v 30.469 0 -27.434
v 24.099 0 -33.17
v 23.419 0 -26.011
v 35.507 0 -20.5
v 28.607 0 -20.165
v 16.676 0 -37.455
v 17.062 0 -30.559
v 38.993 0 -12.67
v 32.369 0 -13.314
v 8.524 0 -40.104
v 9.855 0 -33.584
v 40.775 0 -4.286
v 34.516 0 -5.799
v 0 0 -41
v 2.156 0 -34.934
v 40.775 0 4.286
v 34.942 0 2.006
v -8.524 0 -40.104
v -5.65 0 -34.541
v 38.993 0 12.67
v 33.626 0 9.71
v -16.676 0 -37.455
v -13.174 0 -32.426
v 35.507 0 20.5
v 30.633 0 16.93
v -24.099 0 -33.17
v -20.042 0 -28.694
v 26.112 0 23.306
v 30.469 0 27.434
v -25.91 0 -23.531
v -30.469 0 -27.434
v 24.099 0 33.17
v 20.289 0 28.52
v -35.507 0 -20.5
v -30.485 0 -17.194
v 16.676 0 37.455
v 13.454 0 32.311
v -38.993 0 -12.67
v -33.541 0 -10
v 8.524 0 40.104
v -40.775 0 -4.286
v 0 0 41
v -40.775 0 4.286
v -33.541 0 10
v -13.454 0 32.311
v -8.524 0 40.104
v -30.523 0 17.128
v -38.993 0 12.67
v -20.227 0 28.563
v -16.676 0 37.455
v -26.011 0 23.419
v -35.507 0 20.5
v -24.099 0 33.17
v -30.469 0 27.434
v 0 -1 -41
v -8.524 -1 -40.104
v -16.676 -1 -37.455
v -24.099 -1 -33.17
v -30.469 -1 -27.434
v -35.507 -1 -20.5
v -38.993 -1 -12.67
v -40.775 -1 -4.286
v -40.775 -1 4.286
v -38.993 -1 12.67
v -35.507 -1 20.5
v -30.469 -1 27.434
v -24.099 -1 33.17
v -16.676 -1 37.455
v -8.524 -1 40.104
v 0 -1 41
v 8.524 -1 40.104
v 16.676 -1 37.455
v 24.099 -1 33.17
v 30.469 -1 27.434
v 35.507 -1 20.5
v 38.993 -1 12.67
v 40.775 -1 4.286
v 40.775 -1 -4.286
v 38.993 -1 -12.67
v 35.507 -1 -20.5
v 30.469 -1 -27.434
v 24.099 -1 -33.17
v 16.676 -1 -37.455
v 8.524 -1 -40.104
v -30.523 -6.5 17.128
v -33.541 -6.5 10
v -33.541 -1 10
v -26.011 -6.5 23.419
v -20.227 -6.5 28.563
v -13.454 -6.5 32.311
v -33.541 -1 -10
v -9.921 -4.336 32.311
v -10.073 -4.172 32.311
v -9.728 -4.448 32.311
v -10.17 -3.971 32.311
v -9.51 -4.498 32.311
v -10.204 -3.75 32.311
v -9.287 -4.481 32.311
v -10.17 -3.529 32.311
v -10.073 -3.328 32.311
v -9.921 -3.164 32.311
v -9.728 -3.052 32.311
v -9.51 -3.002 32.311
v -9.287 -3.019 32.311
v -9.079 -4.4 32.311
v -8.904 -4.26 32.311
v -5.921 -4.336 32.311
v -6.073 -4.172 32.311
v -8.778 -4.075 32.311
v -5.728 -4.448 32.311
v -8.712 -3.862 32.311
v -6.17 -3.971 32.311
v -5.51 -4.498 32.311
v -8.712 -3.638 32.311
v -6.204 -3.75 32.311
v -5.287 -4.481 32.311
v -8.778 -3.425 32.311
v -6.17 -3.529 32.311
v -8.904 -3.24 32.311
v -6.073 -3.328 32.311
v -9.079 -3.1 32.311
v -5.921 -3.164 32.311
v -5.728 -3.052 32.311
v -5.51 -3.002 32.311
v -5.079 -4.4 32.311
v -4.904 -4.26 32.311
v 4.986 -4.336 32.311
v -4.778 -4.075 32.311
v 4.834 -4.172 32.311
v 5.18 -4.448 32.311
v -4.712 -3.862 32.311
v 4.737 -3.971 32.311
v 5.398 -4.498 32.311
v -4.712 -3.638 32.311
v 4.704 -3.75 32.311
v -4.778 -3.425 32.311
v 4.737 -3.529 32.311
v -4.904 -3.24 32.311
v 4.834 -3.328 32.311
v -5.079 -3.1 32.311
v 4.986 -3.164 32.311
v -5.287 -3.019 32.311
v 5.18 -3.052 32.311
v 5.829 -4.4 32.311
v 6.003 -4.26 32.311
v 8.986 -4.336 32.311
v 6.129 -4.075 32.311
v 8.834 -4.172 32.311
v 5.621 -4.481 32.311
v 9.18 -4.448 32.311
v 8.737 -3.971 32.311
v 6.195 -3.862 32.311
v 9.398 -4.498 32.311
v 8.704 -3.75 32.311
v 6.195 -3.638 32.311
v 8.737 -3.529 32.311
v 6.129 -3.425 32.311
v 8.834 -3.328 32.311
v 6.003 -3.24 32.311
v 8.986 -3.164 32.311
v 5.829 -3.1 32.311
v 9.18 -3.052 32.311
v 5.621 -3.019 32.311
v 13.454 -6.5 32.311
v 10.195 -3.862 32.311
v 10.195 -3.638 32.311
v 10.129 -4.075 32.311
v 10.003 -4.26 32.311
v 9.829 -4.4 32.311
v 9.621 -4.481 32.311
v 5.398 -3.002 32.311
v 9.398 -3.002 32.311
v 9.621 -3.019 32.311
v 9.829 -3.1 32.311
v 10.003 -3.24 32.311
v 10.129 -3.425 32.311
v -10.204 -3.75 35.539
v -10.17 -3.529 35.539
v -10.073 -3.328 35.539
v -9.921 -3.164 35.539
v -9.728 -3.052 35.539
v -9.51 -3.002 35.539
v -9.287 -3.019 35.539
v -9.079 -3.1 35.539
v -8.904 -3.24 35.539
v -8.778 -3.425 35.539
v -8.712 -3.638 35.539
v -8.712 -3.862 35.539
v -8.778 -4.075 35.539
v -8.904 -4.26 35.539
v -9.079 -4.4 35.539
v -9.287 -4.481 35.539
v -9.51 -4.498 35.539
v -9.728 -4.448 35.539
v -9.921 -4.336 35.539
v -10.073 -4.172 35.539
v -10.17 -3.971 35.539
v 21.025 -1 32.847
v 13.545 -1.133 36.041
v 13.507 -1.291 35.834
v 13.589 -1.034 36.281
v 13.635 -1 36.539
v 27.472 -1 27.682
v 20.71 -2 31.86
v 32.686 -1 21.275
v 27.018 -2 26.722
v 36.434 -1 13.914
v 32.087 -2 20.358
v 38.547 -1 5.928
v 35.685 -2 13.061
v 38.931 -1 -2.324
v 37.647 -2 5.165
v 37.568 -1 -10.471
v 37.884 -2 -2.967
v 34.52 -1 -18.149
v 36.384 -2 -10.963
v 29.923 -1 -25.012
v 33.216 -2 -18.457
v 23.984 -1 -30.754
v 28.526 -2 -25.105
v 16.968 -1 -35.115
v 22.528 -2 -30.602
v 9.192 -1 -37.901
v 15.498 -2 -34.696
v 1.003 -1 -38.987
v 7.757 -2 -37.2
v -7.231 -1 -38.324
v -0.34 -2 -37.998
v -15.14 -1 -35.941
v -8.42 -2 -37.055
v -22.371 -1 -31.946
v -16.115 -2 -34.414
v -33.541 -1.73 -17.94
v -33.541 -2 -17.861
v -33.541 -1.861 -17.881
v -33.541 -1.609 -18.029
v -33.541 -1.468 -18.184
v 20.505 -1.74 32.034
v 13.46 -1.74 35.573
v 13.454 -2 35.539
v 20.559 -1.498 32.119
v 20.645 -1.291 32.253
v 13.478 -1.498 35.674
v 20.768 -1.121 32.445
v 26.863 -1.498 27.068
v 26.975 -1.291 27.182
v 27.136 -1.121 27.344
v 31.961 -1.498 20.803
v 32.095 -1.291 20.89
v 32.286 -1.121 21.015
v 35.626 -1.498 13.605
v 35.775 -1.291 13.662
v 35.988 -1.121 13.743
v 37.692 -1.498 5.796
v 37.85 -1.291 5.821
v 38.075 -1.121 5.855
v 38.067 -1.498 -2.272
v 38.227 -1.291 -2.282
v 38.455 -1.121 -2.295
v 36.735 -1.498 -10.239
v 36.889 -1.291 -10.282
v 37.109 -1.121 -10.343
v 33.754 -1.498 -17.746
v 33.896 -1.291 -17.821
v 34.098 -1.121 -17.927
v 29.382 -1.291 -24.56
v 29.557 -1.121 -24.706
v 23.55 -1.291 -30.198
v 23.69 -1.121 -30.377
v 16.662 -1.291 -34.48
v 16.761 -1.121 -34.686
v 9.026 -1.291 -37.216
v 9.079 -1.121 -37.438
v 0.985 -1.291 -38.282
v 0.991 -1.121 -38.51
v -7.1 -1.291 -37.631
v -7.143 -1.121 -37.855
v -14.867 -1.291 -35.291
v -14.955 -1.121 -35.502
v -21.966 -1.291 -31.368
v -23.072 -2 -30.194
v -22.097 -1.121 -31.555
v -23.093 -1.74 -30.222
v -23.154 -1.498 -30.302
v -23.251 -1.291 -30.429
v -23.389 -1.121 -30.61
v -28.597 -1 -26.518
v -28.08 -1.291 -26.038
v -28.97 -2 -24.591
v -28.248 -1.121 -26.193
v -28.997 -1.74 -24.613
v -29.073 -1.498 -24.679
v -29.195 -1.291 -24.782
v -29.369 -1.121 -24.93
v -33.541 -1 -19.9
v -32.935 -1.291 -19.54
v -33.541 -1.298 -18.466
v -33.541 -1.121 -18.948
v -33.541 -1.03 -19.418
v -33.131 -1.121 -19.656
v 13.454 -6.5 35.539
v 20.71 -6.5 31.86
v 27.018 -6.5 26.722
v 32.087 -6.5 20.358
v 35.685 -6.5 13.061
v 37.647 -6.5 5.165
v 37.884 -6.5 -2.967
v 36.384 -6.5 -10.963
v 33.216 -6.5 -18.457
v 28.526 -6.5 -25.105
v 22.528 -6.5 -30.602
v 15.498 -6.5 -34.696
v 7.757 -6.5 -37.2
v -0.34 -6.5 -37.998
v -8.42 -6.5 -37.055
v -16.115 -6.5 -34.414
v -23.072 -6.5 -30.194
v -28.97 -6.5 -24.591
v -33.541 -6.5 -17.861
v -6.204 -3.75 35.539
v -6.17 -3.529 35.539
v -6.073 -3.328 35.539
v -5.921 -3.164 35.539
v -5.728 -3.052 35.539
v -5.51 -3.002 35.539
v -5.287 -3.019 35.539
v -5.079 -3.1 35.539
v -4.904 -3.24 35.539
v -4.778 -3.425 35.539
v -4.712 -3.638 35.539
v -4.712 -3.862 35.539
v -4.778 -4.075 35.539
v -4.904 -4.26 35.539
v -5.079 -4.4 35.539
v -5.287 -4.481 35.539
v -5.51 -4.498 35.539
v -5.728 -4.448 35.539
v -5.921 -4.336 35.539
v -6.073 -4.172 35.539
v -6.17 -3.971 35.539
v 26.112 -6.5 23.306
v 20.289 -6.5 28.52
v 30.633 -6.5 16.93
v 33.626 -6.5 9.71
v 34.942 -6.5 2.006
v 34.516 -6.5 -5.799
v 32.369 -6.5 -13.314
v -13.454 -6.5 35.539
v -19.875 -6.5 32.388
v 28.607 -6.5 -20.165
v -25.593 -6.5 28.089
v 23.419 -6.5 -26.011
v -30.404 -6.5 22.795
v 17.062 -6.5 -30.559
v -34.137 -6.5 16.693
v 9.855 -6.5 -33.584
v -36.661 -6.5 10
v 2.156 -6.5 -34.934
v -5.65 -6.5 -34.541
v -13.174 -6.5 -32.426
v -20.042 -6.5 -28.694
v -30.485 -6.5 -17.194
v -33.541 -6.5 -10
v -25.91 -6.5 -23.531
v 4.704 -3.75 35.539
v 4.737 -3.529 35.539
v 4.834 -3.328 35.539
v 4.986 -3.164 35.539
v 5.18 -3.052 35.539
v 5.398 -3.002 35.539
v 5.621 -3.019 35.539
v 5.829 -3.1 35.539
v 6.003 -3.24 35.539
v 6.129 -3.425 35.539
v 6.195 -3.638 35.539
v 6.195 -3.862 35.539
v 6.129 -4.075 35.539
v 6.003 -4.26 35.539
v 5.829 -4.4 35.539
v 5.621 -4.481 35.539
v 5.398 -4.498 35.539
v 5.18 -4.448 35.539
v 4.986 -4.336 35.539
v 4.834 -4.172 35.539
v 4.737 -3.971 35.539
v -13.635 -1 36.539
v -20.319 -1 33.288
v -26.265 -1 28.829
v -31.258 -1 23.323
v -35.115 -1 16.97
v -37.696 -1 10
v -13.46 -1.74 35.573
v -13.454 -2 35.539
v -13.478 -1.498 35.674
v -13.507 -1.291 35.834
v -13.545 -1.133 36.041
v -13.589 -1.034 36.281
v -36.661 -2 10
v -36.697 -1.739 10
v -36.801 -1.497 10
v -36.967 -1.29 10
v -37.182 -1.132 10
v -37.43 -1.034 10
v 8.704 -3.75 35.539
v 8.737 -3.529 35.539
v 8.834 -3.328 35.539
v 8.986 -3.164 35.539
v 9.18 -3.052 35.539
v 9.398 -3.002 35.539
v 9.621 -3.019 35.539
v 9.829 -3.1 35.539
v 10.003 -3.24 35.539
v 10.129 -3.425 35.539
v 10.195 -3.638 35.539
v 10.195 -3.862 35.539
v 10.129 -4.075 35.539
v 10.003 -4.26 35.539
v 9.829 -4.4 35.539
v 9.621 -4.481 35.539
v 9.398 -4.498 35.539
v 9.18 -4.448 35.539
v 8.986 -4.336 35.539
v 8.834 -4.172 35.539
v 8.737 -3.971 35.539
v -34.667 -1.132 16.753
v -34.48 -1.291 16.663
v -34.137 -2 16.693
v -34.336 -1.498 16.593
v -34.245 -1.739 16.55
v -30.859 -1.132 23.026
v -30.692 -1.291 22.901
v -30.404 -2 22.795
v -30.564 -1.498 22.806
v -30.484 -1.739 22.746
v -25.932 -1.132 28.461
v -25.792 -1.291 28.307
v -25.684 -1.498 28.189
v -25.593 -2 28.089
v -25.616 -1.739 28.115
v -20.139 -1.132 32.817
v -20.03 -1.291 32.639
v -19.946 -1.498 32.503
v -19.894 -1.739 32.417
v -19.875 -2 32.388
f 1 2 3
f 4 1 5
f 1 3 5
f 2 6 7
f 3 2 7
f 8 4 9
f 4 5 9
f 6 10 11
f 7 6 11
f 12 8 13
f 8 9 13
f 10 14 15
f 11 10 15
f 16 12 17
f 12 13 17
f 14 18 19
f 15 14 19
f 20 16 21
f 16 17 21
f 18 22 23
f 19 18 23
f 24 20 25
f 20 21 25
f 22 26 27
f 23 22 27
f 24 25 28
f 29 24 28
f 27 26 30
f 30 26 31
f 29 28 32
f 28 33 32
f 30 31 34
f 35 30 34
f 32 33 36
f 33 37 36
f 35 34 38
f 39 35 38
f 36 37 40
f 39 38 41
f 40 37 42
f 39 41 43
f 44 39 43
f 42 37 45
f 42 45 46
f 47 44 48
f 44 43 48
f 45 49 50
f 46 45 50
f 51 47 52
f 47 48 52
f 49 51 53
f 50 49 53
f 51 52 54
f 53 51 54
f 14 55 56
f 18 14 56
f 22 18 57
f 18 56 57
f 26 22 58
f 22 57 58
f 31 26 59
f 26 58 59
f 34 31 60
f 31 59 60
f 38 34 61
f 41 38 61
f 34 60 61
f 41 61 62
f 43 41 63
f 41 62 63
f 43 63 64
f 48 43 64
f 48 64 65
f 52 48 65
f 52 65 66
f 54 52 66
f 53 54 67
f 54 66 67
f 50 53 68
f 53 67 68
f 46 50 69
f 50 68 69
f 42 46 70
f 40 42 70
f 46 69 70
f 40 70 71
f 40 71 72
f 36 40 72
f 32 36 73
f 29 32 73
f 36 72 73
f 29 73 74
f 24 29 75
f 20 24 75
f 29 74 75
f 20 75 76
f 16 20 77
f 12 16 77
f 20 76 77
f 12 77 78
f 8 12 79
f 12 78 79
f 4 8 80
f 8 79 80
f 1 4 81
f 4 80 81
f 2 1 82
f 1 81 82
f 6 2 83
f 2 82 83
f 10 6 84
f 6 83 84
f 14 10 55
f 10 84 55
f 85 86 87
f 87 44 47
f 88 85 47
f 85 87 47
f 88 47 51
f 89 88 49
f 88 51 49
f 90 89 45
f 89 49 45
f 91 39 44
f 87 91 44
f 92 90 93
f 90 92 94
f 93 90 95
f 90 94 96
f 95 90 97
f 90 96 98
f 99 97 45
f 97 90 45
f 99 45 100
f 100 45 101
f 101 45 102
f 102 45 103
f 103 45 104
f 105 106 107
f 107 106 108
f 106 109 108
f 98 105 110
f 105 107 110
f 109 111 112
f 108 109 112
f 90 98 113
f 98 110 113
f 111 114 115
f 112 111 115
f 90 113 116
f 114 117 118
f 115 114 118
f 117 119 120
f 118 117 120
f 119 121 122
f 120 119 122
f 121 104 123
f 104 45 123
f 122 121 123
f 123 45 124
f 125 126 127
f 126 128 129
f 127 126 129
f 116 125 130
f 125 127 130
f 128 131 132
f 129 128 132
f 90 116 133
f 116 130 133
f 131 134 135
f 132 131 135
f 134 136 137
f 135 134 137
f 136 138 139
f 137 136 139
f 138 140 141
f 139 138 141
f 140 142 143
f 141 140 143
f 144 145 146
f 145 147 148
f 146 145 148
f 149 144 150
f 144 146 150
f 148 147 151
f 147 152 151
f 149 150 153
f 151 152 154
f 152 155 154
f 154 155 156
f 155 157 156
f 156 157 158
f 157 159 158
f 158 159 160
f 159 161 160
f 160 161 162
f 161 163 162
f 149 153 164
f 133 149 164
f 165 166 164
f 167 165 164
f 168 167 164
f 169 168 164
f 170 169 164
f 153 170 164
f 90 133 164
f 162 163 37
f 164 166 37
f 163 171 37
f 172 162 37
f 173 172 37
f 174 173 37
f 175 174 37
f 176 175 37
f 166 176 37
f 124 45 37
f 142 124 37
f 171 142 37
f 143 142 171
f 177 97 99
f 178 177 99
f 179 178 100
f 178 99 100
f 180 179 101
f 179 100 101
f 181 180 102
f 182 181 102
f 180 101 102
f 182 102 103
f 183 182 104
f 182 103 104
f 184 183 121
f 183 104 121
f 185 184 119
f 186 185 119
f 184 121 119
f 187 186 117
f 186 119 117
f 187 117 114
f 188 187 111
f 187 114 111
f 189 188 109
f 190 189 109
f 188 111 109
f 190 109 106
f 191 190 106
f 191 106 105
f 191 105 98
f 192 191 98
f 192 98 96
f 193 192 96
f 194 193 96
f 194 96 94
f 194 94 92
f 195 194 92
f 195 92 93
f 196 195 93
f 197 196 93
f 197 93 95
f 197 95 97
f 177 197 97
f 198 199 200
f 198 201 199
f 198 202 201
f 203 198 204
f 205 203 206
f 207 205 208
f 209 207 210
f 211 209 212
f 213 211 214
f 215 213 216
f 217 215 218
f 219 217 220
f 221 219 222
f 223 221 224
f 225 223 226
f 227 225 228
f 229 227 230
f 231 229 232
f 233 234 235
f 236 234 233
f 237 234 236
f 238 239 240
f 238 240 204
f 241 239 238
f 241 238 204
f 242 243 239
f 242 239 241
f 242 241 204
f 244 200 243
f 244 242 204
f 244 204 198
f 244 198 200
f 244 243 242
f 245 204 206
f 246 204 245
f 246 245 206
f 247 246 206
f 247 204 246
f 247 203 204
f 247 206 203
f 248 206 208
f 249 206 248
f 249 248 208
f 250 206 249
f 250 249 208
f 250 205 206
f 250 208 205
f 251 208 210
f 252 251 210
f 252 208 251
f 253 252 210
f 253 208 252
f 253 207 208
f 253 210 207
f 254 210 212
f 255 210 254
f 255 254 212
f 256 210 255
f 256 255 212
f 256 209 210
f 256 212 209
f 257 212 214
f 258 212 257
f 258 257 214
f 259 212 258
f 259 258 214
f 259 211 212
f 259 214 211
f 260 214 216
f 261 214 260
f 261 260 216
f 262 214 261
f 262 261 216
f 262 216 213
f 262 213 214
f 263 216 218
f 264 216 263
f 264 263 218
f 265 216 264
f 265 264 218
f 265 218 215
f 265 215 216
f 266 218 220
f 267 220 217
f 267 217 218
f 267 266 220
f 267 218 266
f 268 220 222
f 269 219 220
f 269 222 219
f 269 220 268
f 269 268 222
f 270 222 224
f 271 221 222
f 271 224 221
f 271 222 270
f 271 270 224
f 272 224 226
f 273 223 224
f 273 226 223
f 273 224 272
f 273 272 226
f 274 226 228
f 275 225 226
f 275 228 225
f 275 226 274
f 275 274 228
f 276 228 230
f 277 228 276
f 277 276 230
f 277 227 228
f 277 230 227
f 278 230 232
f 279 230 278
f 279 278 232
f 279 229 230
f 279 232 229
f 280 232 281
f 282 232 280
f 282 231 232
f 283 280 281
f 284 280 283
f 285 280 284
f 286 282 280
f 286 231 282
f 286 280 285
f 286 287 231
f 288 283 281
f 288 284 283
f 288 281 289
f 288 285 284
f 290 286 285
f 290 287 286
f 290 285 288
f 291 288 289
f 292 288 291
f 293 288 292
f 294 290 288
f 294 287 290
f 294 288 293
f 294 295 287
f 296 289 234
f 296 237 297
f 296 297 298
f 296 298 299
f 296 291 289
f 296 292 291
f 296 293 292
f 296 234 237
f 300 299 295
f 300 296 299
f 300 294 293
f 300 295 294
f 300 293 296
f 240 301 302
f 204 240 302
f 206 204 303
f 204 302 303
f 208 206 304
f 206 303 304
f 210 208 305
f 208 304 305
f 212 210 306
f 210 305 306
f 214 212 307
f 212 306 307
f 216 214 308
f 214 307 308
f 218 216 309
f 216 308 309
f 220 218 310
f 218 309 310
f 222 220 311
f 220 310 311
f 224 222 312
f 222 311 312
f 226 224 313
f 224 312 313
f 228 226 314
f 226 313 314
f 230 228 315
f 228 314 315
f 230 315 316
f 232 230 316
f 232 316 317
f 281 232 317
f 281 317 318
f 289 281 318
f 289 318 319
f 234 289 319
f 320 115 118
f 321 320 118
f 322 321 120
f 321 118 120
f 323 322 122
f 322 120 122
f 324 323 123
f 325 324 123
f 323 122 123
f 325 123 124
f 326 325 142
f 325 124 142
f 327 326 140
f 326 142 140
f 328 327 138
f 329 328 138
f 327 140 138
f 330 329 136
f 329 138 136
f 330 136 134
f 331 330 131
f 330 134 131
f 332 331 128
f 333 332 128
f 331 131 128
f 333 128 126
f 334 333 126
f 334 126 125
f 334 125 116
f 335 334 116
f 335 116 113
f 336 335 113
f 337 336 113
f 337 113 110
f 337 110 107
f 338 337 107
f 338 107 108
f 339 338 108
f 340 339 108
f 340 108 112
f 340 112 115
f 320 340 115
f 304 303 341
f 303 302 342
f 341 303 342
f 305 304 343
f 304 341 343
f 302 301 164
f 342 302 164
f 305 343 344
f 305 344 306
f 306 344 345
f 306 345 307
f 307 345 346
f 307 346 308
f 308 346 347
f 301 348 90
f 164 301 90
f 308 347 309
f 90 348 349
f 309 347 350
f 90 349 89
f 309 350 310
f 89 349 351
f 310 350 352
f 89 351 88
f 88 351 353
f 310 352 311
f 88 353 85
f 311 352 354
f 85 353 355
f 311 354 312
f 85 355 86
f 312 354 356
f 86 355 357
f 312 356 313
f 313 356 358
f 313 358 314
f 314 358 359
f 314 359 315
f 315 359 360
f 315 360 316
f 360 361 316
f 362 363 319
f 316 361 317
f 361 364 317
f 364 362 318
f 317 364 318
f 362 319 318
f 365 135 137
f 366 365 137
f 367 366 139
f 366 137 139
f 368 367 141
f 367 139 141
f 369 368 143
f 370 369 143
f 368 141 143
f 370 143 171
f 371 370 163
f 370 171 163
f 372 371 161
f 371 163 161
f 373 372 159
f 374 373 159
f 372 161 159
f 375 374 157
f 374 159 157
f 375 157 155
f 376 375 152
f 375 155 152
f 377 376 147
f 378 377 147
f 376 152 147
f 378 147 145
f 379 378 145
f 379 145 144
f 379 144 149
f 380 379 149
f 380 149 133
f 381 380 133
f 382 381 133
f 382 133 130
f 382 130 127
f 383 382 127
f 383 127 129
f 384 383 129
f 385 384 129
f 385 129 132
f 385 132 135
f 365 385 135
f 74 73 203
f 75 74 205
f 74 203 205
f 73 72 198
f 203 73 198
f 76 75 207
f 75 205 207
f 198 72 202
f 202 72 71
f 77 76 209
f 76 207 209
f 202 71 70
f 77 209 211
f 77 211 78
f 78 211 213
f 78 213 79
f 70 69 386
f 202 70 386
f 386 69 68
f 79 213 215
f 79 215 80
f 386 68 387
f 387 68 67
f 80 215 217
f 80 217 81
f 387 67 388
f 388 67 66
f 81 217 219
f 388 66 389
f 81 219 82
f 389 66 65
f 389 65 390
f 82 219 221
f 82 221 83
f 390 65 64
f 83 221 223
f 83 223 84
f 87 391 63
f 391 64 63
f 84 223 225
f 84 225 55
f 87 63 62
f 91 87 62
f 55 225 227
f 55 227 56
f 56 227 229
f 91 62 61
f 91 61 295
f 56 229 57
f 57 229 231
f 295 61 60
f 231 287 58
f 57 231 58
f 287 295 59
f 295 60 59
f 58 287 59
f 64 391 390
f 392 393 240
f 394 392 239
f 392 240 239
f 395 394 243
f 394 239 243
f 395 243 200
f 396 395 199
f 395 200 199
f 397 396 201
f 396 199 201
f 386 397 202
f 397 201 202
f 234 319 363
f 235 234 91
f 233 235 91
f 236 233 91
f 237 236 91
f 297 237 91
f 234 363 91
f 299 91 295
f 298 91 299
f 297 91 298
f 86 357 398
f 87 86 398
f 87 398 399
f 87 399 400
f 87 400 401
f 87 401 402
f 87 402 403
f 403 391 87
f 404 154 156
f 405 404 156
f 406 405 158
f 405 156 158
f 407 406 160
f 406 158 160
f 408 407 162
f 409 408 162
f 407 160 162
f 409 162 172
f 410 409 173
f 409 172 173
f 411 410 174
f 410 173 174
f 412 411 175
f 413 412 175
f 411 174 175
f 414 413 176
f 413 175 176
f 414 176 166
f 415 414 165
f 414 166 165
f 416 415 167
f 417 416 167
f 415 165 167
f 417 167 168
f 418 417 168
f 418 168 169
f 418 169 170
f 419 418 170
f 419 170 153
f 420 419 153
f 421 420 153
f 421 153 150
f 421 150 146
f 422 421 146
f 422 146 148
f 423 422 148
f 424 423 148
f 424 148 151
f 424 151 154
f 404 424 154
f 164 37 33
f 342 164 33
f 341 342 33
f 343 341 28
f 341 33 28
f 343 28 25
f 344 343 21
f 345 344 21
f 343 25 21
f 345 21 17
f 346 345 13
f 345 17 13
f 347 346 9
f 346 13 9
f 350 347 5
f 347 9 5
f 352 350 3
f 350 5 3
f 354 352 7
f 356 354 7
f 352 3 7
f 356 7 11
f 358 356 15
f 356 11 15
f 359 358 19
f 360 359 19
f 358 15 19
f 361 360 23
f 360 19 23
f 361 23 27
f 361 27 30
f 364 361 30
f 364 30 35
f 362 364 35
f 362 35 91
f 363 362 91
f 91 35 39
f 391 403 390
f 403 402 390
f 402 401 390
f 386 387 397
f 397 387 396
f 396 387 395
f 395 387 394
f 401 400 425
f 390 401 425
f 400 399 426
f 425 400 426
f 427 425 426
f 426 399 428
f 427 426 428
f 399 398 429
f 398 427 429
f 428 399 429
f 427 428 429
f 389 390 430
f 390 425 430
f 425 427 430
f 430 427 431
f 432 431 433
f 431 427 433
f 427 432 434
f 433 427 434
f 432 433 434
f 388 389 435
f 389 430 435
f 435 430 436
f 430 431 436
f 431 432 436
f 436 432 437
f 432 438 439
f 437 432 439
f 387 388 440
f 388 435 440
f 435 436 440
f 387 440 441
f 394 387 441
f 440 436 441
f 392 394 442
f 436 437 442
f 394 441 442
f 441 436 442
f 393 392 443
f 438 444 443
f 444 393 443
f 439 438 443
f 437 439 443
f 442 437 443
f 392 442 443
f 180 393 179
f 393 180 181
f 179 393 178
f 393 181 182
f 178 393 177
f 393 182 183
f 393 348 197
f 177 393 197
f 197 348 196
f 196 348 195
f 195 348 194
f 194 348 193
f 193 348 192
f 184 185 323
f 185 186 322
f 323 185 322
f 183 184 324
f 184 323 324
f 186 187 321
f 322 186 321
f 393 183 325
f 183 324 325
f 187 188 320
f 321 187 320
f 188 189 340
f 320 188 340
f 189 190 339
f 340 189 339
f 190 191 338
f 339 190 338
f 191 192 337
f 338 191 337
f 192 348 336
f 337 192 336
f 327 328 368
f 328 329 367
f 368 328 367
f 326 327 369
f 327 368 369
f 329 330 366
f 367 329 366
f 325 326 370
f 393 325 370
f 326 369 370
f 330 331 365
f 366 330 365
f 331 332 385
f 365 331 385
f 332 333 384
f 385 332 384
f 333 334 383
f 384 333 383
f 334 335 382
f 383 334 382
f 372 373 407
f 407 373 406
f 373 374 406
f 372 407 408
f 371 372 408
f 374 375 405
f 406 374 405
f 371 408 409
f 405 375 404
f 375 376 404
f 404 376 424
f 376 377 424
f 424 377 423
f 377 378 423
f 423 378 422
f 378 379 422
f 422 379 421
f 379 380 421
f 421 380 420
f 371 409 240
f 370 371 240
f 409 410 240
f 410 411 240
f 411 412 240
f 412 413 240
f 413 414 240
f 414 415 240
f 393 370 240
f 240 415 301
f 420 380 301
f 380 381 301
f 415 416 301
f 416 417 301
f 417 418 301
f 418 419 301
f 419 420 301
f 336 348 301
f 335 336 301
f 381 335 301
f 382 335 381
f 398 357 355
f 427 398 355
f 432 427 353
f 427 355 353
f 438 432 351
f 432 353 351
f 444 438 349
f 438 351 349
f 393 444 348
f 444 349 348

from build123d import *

# Parameters (mm, degrees)
CUT_EXTRUDE1_DEPTH             = 59.345951016
CUT_EXTRUDE3_DEPTH             = 5.5
SKETCH10_W                     = 20
SKETCH10_H                     = 5.5
CUT_EXTRUDE5_DEPTH             = 10
F_1_5_1_5_DIAMETER_HOLE1_D     = 1.5
F_1_5_1_5_DIAMETER_HOLE1_DEPTH = 3.227722445
SKETCH12_W                     = 3.119585898
SKETCH12_H                     = 5.5
CUT_EXTRUDE6_DEPTH             = 66.759029798
FILLET1_R                      = 1


with BuildPart() as part:
    # Sketch2 → Revolve1 (revolve)
    with BuildSketch(Plane(origin=(0, 0, 0), x_dir=(0, 0, -1), z_dir=(1, 0, 0))):
        Polygon((0, 0), (41, 0), (41, -1), (38, -1), (38, -6.5), (0, -6.5), align=None)
    revolve(axis=Axis((0, -6.5, 0), (0, 1, 0)))

    # Sketch3 → Cut-Extrude1 (cut, through all)
    with BuildSketch(Plane(origin=(0, 0, 0), x_dir=(1, 0, 0), z_dir=(0, 1, 0))):
        with BuildLine():
            Line((-13.453624047, -32.310988843), (13.453624047, -32.310988843))
            ThreePointArc((13.453624047, -32.310988843), (23.418599656, 26.010943661), (-33.541019662, 10))
            Line((-33.541019662, 10), (-33.541019662, -10))
            ThreePointArc((-33.541019662, -10), (-26.010943661, -23.418599656), (-13.453624047, -32.310988843))
        make_face()
    extrude(amount=-CUT_EXTRUDE1_DEPTH, mode=Mode.SUBTRACT)

    # Sketch6 → Cut-Extrude3 (cut)
    with BuildSketch(Plane.XZ.offset(6.5)):
        with BuildLine():
            Line((-13.453624047, 35.538711288), (13.453624047, 35.538711288))
            ThreePointArc((13.453624047, 35.538711288), (0, 38), (-13.453624047, 35.538711288))
        make_face()
        with BuildLine():
            Line((-36.66060556, -10), (-36.66060556, 10))
            ThreePointArc((-36.66060556, 10), (-38, 0), (-36.66060556, -10))
        make_face()
    extrude(amount=-CUT_EXTRUDE3_DEPTH, mode=Mode.SUBTRACT)

    # Sketch10 → Cut-Extrude5 (cut)
    with BuildSketch(Plane.ZY.offset(36.66060556)):
        with Locations((0, -3.75)):
            Rectangle(SKETCH10_W, SKETCH10_H)
    extrude(amount=-CUT_EXTRUDE5_DEPTH, mode=Mode.SUBTRACT)

    # Ø1.5 (1.5) Diameter Hole1
    with Locations(Plane.XY.offset(35.538711288)):
        with Locations((9.453624047, -3.75), (5.453624047, -3.75), (-5.453624047, -3.75), (-9.453624047, -3.75)):
            Hole(F_1_5_1_5_DIAMETER_HOLE1_D / 2, depth=F_1_5_1_5_DIAMETER_HOLE1_DEPTH)

    # Sketch12 → Cut-Extrude6 (cut, through all)
    with BuildSketch(Plane.XY.offset(-10)):
        with Locations((-35.100812611, -3.75)):
            Rectangle(SKETCH12_W, SKETCH12_H)
    extrude(amount=-CUT_EXTRUDE6_DEPTH, mode=Mode.SUBTRACT)

    # Fillet1
    fillet1_edges = [part.edges().sort_by_distance(p)[0] for p in [
        (-28.123218981, -1, 25.555519055),
        (0, -1, 35.538711288),
        (28.526245907, -1, -25.104846036),
    ]]
    fillet(fillet1_edges, radius=FILLET1_R)


solid = part.part
